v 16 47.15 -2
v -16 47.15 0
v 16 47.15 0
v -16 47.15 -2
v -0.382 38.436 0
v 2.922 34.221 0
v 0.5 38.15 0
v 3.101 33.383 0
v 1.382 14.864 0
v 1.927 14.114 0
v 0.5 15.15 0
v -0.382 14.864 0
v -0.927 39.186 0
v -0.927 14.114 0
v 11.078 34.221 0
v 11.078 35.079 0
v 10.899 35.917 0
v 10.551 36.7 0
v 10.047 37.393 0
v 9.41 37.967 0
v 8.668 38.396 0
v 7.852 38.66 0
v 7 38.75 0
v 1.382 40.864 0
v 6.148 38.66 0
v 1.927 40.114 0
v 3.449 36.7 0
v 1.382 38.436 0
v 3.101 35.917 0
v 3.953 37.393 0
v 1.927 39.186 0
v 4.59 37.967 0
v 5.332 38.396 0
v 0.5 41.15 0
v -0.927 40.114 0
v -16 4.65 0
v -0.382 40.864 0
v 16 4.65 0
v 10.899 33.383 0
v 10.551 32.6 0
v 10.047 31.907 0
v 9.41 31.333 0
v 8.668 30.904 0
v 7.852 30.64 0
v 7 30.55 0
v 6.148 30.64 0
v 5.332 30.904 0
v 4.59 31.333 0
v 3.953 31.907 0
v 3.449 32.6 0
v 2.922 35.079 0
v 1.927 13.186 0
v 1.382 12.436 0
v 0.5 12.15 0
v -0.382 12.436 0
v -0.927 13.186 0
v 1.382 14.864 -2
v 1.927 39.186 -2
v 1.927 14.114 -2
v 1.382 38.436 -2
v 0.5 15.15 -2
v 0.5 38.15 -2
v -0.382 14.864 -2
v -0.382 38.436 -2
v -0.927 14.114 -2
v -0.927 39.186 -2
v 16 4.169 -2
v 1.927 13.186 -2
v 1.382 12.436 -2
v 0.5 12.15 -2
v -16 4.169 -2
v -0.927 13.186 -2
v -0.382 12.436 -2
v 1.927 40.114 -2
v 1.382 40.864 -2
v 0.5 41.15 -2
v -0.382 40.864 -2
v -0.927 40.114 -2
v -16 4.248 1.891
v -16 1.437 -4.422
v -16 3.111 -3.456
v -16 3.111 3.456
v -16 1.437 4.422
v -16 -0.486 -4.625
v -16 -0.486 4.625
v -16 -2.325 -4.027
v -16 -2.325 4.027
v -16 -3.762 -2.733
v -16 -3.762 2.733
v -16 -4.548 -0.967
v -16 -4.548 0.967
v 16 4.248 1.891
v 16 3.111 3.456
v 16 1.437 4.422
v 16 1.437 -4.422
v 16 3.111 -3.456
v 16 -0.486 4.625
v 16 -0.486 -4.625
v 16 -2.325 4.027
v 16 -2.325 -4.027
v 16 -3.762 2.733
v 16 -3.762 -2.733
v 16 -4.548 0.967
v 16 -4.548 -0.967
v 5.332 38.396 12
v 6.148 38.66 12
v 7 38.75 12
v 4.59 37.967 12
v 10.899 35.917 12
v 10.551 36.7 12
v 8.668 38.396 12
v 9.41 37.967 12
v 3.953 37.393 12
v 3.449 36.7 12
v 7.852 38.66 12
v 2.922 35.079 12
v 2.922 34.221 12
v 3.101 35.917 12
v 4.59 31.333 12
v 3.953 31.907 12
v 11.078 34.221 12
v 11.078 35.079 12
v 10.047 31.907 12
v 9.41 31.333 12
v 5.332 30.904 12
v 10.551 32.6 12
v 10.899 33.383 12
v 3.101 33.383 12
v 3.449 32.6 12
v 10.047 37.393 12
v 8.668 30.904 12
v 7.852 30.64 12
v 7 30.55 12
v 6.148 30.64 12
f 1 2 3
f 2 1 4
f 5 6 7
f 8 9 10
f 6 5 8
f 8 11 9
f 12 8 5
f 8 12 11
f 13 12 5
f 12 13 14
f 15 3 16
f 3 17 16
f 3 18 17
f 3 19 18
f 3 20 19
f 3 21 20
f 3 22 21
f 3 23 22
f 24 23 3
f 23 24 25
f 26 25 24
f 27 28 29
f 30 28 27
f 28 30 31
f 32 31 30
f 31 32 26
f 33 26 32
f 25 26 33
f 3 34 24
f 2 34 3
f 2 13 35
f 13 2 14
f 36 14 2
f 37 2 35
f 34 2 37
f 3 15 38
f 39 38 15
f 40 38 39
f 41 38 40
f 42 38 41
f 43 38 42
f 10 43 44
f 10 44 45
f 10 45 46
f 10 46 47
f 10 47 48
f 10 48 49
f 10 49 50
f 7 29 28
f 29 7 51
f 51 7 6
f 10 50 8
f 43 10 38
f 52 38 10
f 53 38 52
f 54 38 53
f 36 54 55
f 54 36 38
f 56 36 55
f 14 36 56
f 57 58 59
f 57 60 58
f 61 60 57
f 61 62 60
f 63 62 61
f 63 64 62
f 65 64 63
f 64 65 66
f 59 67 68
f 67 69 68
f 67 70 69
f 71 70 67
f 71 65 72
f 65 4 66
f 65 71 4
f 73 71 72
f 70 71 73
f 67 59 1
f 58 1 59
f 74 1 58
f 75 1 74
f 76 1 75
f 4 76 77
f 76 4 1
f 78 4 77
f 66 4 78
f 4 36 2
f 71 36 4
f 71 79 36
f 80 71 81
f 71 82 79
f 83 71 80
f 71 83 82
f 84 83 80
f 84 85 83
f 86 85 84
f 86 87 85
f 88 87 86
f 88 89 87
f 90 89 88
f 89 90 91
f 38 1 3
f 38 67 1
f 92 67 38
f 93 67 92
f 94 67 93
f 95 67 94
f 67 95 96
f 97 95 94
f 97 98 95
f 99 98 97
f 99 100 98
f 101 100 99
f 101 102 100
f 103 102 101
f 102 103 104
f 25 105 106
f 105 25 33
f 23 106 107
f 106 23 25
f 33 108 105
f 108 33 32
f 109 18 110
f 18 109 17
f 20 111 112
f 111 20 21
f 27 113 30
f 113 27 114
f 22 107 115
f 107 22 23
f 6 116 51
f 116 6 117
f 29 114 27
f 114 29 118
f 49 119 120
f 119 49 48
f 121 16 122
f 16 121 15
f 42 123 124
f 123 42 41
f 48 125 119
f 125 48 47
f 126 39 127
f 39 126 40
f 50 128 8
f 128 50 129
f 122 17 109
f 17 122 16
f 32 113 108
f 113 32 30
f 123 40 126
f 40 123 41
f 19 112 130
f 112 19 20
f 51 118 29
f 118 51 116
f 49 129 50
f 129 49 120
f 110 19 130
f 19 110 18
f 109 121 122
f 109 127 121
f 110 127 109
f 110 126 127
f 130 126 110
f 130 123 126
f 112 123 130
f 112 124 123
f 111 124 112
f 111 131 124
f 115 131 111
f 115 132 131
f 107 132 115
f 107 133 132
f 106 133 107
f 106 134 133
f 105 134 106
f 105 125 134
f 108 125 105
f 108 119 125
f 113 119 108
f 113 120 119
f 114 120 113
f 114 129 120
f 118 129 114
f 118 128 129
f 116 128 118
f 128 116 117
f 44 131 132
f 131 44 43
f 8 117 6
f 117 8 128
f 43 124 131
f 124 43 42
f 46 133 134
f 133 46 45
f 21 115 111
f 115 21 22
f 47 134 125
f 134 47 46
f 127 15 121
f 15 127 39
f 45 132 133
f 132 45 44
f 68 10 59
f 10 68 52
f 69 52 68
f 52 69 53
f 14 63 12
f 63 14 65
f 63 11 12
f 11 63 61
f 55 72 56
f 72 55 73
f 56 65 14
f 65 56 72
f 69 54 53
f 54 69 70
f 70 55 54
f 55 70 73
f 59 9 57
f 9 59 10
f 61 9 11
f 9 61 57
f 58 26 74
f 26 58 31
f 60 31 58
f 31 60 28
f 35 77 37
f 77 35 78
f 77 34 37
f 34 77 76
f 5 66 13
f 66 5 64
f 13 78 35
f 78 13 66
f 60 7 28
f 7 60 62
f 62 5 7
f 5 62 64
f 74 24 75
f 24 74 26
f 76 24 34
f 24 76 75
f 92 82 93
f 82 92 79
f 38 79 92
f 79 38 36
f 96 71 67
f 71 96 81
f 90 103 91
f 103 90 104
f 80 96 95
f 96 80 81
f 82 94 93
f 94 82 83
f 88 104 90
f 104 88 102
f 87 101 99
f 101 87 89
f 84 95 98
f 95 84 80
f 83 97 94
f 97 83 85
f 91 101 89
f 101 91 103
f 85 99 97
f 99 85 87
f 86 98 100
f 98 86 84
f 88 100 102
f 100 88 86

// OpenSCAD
//CircuitBoard

battery_rad = 9.3 / 2;
battery_h = 32;
cb_length = 42.5;
cb_thickness = 2;

button_x = 31;
button_y = 9;
button_r = 3 / 2;
button_h = 2.5;

button_hole_r = 8.2 / 2;

hole_x = 15.5;
hole1_y = 9;
hole2_y = cb_length - 7.5;
hole_r = 3/2;

circuit();

module circuit(){
	rotate([ 0, 0, 90]){
		translate([ battery_rad, battery_h * -0.5, cb_thickness * -1]){
			difference(){
				translate([-1, 0, 0])board();
				translate([hole1_y, hole_x, 0])cylinder(r = hole_r, h = 10, center = true, $fn = 10);
				translate([hole2_y, hole_x, 0])cylinder(r = hole_r, h = 10, center = true, $fn = 10);
			}
		}
		battery();
	}
}

module board(){
	color([ 0.1, 0.7, 0.2])cube([cb_length + 1, battery_h, cb_thickness]);
	translate([ button_x, button_y, cb_thickness])color([1, 0 ,0])cylinder(r = button_r, h = 2.5, $fn = 10);
	translate([ button_x, button_y, cb_thickness])color([1, 0 ,0])cylinder(r = button_hole_r, h = 12, $fn = 30);
}


module battery(){
	color([0.9, 0.8, 0])translate([0, battery_h * 0.5 ,0])rotate([ 90, 0, 0])cylinder( r = battery_rad, h = battery_h);
}
